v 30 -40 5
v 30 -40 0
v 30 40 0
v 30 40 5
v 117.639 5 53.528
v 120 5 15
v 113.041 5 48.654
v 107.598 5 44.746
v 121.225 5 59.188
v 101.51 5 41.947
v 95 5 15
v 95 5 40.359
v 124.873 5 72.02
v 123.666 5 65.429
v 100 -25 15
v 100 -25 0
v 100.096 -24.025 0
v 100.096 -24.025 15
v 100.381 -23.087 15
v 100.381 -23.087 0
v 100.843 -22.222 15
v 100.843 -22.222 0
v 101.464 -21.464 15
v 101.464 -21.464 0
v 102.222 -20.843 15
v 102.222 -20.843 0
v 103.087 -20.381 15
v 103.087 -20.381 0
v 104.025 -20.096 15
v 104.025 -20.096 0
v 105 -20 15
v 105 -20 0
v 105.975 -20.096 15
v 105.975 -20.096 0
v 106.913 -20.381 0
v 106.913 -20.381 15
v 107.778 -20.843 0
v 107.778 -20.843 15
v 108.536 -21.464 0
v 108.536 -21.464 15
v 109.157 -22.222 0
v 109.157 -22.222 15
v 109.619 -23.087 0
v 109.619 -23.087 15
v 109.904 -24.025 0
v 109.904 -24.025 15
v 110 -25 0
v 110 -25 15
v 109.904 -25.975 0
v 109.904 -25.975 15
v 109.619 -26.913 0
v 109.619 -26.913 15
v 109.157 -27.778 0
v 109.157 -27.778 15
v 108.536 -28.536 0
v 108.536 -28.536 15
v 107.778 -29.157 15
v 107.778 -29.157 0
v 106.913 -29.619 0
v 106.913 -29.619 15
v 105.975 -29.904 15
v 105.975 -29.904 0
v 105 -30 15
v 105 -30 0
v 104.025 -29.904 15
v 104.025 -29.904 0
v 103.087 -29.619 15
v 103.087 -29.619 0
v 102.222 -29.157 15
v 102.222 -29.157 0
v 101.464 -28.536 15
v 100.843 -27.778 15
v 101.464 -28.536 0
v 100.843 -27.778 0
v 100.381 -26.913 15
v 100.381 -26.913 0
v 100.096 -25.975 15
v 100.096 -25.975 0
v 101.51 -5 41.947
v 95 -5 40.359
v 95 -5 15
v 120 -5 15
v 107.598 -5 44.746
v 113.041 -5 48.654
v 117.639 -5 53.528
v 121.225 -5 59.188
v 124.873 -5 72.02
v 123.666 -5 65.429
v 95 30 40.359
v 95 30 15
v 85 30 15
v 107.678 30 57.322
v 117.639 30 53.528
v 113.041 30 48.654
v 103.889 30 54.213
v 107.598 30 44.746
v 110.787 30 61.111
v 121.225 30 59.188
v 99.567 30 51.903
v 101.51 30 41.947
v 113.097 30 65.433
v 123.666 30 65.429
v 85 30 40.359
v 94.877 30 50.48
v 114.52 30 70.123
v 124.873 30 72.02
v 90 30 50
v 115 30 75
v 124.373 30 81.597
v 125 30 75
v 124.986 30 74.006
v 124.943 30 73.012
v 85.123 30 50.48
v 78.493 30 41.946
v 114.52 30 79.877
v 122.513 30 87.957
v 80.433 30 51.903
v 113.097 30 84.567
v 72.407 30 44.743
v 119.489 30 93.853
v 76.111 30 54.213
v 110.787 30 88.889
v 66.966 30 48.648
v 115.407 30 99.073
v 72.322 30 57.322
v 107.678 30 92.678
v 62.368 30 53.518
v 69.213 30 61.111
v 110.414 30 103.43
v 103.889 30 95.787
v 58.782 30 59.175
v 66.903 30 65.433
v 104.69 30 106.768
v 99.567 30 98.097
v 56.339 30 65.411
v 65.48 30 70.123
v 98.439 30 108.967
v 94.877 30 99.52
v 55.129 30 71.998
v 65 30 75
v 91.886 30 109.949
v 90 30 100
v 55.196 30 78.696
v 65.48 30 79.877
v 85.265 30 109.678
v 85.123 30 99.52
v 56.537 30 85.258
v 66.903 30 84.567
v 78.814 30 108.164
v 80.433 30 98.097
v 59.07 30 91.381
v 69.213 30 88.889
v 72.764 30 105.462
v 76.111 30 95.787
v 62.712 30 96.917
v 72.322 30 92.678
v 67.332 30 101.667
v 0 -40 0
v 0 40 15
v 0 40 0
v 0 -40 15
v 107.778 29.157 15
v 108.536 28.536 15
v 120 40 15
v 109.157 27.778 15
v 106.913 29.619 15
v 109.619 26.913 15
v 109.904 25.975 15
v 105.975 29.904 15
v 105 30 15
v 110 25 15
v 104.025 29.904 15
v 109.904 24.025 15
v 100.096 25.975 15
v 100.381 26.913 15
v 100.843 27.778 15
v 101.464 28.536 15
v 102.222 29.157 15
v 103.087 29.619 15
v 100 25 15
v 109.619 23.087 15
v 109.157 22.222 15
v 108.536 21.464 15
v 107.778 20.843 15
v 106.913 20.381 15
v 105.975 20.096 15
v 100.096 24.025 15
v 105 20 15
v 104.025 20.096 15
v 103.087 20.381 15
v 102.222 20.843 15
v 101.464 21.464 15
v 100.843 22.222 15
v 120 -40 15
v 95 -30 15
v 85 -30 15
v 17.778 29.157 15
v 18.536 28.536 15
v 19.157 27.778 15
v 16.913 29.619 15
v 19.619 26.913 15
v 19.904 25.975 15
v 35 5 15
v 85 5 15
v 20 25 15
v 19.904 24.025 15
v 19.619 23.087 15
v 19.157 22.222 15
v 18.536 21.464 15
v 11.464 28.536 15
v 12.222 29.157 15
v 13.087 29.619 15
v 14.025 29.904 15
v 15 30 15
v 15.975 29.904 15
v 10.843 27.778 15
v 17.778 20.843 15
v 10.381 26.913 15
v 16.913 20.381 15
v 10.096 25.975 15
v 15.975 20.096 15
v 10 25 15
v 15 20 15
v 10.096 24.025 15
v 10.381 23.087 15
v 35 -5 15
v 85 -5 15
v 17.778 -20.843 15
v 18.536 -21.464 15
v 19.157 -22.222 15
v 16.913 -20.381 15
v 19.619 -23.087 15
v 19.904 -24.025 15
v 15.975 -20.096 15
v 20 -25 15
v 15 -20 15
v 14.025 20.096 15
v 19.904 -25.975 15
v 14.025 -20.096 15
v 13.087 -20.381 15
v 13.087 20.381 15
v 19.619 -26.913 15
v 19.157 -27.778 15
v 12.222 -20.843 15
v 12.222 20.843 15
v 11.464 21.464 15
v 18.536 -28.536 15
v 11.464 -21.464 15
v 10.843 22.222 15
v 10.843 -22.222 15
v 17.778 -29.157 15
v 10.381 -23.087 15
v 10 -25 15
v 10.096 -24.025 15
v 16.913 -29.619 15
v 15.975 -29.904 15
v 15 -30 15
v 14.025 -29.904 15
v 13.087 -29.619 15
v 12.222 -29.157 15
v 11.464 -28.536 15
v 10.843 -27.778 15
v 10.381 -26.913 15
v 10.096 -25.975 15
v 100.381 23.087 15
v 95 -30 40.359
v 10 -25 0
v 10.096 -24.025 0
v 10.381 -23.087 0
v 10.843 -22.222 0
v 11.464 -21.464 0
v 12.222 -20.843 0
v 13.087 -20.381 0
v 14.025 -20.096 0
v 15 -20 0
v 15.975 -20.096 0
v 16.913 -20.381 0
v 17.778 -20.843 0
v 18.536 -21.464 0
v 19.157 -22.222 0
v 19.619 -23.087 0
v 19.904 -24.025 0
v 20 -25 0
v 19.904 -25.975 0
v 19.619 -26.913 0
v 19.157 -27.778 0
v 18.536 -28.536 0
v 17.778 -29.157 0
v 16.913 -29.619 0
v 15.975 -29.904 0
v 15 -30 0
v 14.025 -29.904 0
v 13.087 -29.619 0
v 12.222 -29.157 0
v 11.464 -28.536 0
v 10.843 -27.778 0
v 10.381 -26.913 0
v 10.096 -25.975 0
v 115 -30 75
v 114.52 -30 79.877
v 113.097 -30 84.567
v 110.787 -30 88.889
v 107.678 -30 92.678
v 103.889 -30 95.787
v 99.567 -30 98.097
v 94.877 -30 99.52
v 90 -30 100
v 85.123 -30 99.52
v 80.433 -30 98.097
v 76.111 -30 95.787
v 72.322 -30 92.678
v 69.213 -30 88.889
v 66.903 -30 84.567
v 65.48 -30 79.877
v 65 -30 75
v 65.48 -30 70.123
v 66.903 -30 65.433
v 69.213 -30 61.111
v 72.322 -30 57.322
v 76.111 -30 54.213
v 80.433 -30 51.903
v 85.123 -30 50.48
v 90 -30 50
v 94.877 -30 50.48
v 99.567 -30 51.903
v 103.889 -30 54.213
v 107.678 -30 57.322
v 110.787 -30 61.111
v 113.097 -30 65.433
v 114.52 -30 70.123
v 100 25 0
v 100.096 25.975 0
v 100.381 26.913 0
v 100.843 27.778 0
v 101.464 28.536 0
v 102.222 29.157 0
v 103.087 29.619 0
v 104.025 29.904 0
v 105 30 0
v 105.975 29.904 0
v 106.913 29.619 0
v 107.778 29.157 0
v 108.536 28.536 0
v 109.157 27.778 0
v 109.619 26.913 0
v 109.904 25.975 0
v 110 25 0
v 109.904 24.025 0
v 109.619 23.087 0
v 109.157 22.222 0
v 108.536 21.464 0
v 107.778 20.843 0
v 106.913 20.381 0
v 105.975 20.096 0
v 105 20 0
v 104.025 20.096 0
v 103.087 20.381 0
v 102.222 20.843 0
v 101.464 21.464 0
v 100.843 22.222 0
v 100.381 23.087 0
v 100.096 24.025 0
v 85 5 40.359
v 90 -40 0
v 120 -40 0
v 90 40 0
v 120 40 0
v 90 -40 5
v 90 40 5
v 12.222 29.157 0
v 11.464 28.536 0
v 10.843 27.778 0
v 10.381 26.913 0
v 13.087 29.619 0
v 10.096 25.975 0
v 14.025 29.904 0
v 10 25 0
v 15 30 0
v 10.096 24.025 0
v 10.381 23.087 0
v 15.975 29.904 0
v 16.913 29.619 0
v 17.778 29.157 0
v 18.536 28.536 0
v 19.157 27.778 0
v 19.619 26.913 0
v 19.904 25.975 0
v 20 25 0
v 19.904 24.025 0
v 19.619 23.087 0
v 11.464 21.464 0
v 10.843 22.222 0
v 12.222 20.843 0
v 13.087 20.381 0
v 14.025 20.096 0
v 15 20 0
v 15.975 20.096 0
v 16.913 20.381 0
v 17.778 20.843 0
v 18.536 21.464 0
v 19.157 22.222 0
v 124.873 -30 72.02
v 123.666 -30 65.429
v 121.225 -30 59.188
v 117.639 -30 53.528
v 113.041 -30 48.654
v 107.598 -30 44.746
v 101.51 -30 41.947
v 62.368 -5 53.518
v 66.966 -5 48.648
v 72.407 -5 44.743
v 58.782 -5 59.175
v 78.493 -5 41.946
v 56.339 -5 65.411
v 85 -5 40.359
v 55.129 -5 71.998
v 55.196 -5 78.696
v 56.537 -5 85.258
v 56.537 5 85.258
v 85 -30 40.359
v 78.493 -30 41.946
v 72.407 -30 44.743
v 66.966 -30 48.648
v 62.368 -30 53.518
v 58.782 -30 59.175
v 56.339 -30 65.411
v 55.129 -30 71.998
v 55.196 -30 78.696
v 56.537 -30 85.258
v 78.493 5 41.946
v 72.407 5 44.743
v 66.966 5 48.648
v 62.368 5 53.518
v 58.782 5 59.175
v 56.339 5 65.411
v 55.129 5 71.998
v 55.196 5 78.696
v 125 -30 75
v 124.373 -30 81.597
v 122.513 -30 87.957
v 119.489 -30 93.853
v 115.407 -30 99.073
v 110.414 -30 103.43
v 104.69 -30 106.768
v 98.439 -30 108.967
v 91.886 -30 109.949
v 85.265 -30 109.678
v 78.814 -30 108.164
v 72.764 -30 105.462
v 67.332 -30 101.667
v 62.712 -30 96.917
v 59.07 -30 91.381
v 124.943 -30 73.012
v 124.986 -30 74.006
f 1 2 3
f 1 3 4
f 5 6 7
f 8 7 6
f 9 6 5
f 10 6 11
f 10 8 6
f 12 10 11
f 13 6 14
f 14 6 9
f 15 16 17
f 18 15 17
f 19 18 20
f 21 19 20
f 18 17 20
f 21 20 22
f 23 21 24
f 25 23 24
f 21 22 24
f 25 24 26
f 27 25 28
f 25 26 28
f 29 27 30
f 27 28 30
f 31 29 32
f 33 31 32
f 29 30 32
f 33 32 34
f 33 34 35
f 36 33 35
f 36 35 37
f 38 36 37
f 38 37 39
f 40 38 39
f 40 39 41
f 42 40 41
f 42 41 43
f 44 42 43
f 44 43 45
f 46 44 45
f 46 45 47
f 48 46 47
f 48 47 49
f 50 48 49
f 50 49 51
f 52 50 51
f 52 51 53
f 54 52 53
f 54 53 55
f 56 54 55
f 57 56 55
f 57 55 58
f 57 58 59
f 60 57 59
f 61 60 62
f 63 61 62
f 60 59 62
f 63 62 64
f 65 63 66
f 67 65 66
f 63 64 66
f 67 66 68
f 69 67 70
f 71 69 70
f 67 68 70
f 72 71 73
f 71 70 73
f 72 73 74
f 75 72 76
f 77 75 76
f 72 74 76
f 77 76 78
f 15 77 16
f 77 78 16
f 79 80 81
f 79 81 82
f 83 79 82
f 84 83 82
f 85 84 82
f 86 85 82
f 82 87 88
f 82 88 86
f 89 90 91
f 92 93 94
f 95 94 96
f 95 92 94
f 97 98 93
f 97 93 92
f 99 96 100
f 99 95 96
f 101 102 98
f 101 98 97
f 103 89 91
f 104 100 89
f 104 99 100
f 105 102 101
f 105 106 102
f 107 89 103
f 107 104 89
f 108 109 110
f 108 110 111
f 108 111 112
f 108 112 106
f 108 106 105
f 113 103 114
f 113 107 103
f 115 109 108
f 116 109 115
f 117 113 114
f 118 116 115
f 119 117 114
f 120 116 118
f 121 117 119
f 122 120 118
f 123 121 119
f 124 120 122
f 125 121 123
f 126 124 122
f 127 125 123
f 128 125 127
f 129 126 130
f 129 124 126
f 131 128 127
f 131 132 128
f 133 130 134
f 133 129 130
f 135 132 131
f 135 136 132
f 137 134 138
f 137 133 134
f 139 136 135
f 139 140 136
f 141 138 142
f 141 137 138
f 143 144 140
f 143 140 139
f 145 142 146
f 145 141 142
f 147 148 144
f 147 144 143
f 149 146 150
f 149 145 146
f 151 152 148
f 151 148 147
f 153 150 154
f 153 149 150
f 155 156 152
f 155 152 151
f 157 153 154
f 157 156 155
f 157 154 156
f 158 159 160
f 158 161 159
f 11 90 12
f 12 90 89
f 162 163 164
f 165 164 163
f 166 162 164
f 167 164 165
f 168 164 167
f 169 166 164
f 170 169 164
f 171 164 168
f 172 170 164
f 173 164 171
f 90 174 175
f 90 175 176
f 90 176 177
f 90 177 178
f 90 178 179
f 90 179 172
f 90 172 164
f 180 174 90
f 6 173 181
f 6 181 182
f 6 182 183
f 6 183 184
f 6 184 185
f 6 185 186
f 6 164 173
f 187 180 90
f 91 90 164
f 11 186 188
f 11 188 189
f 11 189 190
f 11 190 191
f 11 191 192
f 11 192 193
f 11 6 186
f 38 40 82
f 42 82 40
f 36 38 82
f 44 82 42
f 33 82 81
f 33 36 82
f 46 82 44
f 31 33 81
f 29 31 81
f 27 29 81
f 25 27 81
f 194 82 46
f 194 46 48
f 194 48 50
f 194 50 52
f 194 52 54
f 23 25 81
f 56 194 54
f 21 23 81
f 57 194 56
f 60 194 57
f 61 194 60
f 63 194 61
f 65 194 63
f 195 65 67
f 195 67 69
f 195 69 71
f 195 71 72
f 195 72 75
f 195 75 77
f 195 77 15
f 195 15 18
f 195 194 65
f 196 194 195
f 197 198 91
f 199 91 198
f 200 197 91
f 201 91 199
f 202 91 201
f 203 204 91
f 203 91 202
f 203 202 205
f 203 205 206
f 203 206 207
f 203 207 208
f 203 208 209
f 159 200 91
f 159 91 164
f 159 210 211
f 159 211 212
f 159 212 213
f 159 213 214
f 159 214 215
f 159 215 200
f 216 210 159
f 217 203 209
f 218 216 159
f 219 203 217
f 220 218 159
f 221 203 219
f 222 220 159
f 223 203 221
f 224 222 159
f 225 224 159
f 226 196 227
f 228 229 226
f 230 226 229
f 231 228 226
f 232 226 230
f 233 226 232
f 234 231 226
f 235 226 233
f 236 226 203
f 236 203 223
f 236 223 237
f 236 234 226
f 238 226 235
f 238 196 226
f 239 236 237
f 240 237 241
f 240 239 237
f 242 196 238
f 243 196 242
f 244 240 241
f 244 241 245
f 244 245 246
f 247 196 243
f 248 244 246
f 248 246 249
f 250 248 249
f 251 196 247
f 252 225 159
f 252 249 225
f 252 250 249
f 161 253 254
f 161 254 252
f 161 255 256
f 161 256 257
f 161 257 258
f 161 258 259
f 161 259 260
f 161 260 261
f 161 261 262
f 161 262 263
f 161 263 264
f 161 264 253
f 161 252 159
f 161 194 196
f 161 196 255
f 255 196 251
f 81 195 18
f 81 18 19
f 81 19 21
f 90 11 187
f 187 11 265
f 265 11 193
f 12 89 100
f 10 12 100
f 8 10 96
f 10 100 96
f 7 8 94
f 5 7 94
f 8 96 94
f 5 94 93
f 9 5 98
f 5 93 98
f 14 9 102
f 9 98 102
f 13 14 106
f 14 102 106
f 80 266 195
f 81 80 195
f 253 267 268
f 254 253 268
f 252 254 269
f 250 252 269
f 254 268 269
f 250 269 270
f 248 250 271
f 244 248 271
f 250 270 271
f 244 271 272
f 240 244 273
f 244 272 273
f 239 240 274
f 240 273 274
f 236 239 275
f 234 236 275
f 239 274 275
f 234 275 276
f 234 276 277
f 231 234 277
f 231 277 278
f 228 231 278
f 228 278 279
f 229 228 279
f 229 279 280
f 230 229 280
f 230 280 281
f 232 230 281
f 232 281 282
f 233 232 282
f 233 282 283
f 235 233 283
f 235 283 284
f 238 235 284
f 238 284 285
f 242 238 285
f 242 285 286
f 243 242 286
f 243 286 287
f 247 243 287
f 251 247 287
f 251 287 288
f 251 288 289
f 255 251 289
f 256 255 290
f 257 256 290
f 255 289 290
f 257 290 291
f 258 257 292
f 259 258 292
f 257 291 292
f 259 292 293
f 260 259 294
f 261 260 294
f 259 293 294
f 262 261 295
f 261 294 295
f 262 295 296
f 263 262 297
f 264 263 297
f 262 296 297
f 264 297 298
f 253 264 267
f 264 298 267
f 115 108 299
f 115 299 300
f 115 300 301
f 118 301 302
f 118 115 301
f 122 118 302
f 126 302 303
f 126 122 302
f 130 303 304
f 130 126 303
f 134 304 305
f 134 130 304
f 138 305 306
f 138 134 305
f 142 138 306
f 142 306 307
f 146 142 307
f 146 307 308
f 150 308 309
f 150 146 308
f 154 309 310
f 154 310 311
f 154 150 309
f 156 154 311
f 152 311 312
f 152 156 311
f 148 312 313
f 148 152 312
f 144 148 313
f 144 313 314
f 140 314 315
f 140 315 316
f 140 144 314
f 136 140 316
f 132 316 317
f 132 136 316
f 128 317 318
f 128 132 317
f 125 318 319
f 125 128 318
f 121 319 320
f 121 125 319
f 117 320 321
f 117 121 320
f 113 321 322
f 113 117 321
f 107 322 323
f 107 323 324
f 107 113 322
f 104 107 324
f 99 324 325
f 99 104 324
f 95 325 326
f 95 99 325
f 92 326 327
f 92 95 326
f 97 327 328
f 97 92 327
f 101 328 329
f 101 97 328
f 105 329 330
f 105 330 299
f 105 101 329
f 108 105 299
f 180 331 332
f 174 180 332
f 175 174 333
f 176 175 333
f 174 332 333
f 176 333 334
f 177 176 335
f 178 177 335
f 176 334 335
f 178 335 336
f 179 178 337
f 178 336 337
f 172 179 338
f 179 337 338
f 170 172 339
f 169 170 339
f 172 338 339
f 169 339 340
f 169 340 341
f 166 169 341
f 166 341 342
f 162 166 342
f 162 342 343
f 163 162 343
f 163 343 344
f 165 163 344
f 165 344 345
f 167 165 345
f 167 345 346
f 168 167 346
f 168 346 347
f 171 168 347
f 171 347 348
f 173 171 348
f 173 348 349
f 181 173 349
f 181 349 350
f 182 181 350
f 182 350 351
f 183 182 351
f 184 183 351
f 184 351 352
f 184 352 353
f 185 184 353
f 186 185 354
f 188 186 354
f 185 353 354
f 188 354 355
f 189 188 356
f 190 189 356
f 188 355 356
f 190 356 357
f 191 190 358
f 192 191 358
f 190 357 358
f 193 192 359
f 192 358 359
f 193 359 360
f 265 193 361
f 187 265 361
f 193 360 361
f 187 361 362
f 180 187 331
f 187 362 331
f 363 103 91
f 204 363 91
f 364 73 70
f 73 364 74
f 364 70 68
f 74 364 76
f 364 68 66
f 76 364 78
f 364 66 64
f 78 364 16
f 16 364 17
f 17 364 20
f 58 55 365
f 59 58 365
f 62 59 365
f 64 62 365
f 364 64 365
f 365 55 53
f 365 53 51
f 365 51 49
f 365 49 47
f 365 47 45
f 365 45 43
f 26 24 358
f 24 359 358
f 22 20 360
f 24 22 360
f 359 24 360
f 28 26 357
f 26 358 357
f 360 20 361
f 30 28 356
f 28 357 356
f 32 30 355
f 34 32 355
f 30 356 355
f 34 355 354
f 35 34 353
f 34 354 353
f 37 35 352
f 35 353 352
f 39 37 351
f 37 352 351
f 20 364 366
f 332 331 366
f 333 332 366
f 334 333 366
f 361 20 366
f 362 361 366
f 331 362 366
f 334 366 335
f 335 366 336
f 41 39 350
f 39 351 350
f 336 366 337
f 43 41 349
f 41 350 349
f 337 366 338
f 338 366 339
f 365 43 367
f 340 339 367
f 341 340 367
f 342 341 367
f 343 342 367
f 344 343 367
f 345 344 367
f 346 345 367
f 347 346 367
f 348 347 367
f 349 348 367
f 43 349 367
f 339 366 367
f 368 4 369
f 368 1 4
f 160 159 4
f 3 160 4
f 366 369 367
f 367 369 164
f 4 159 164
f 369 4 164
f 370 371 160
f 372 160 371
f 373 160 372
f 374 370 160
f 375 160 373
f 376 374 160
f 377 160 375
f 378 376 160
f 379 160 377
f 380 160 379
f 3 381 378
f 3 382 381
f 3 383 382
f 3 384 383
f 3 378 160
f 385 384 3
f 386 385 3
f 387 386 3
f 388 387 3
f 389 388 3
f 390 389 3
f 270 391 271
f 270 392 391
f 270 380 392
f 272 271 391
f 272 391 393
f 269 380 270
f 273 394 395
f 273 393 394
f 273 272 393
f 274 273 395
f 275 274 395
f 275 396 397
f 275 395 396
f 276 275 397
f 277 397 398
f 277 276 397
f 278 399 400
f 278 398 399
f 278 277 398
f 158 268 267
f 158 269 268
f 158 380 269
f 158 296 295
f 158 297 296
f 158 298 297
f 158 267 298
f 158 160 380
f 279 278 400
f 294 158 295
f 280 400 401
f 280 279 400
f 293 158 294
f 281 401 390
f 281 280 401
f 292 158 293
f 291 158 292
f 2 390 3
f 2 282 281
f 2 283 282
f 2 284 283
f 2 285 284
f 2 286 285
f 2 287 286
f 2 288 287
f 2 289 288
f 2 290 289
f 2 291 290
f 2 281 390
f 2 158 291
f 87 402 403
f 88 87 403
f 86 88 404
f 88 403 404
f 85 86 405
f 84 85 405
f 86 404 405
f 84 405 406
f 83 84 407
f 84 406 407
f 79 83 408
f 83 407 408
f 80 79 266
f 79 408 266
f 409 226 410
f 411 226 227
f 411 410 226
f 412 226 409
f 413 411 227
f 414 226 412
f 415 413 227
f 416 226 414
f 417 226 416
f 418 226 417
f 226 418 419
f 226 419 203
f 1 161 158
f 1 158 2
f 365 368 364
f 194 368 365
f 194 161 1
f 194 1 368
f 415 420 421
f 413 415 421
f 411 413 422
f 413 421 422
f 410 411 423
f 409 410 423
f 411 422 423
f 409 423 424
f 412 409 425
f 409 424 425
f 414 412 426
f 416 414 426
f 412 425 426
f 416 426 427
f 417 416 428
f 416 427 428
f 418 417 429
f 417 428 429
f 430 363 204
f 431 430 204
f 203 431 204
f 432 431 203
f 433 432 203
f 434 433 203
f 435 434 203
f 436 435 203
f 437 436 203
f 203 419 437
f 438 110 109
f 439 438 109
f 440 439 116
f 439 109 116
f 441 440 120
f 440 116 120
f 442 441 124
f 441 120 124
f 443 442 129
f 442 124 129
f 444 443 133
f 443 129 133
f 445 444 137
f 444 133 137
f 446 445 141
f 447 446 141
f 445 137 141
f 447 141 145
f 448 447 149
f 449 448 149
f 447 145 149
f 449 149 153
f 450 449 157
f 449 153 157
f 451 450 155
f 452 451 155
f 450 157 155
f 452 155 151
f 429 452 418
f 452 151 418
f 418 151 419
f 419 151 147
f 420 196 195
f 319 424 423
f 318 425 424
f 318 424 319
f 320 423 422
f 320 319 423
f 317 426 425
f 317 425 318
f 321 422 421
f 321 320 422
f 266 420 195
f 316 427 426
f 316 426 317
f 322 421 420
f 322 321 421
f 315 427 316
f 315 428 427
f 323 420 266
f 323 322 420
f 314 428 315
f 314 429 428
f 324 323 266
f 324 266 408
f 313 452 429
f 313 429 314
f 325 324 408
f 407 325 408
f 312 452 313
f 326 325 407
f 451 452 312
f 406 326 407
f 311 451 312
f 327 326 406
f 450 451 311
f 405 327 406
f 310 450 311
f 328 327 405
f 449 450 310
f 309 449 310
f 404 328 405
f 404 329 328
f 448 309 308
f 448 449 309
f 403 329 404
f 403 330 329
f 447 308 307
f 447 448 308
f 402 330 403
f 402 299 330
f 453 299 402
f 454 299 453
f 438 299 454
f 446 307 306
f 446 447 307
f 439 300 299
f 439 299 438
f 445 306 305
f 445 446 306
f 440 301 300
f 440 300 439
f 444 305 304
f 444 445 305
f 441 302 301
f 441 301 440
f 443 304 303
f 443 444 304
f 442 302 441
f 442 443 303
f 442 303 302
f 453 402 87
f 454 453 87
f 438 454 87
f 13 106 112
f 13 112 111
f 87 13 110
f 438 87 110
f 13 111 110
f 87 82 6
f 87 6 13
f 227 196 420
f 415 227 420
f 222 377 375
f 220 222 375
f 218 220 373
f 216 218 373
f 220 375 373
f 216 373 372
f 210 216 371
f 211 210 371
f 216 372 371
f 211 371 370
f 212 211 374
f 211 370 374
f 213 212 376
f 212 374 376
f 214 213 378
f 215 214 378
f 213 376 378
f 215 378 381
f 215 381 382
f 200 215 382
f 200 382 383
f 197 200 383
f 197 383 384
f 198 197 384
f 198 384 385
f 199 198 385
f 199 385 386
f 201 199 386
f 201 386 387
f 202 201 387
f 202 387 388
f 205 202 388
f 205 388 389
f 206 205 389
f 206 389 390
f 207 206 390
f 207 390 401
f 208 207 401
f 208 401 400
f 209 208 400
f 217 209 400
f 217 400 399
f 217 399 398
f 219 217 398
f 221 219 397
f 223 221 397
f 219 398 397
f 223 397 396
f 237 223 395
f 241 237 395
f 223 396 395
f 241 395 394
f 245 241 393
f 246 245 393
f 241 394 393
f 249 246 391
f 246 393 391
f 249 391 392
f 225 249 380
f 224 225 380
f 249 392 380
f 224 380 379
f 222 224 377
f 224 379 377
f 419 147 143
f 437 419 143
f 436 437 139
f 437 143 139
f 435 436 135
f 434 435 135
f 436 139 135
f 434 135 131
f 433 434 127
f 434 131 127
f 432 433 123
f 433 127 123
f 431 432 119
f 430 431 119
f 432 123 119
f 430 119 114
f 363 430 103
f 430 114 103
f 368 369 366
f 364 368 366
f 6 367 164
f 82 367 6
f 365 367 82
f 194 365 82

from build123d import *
from build123d import SkipClean  # not in build123d's __all__

# Parameters (mm, degrees)
F0_R      = 25
F1_DEPTH  = 40
F2_R      = 25
F3_DEPTH  = 10
F4_R      = 25
F5_DEPTH  = 10
F7_DEPTH  = 25
F9_DEPTH  = 25
F11_D     = 10
F11_DEPTH = 16.5
F11_TIP   = 3.0043030951


with BuildPart() as f1:
    # F0 (on Front) → F1 (new body, symmetric)
    with BuildSketch(Plane.XZ):
        Polygon((0, 15), (0, 0), (30, 0), (30, 5), (90, 5), (90, 0), (120, 0), (120, 15), (35, 15), align=None)
        with BuildLine():
            Line((56.536927729, 85.2578162484), (35, 15))
            Line((35, 15), (120, 15))
            Line((120, 15), (124.8728873319, 72.0197769993))
            ThreePointArc((124.8728873319, 72.0197769993), (83.3435508402, 40.638805542), (56.536927729, 85.2578162484))
        make_face()
        with BuildLine():
            ThreePointArc((125, 75), (95.186158044, 109.613635532), (56.536927729, 85.2578162484))
            ThreePointArc((56.536927729, 85.2578162484), (83.3435508402, 40.638805542), (124.8728873319, 72.0197769993))
            ThreePointArc((124.8728873319, 72.0197769993), (124.9682073934, 73.5085337111), (125, 75))
        make_face()
        with Locations((90, 75)):
            Circle(F0_R, mode=Mode.SUBTRACT)
    extrude(amount=F1_DEPTH, both=True)

    # F2 (on face) → F3 (cut)
    with BuildSketch(Plane.XZ.offset(40)):
        with BuildLine():
            Line((56.536927729, 85.2578162484), (35, 15))
            Line((35, 15), (120, 15))
            Line((120, 15), (124.8728873319, 72.0197769993))
            ThreePointArc((124.8728873319, 72.0197769993), (96.6564491598, 109.361194458), (56.536927729, 85.2578162484))
        make_face()
        with Locations((90, 75)):
            Circle(F2_R, mode=Mode.SUBTRACT)
    extrude(amount=-F3_DEPTH, mode=Mode.SUBTRACT)

    # F4 (on face) → F5 (cut)
    with BuildSketch(Plane(origin=(0, 40, 0), x_dir=(-1, 0, 0), z_dir=(0, 1, 0))):
        with BuildLine():
            Line((-120, 15), (-35, 15))
            Line((-35, 15), (-56.536927729, 85.2578162484))
            ThreePointArc((-56.536927729, 85.2578162484), (-96.6564491598, 109.361194458), (-124.8728873319, 72.0197769993))
            Line((-124.8728873319, 72.0197769993), (-120, 15))
        make_face()
        with Locations((-90, 75)):
            Circle(F4_R, mode=Mode.SUBTRACT)
    extrude(amount=-F5_DEPTH, mode=Mode.SUBTRACT)

    # F6 (on face) → F7 (cut)
    with BuildSketch(Plane.XZ.offset(30)):
        with BuildLine():
            ThreePointArc((85, 40.3589838486), (60.439413574, 56.2604234265), (56.536927729, 85.2578162484))
            Line((56.536927729, 85.2578162484), (35, 15))
            Line((35, 15), (85, 15))
            Line((85, 15), (85, 40.3589838486))
        make_face()
        with BuildLine():
            Line((120, 15), (124.8728873319, 72.0197769993))
            ThreePointArc((124.8728873319, 72.0197769993), (115.4570862783, 50.980492132), (95, 40.3589838486))
            Line((95, 40.3589838486), (95, 15))
            Line((95, 15), (120, 15))
        make_face()
    with SkipClean():  # cleaning this boolean's faces spoils the solid; the shape is the same uncleaned
        extrude(amount=-F7_DEPTH, mode=Mode.SUBTRACT)

    # F8 (on face) → F9 (cut)
    with BuildSketch(Plane(origin=(0, 30, 0), x_dir=(-1, 0, 0), z_dir=(0, 1, 0))):
        with BuildLine():
            ThreePointArc((-95, 40.3589838486), (-115.4570862783, 50.980492132), (-124.8728873319, 72.0197769993))
            Line((-124.8728873319, 72.0197769993), (-120, 15))
            Line((-120, 15), (-95, 15))
            Line((-95, 15), (-95, 40.3589838486))
        make_face()
        with BuildLine():
            Line((-35, 15), (-56.536927729, 85.2578162484))
            ThreePointArc((-56.536927729, 85.2578162484), (-60.439413574, 56.2604234265), (-85, 40.3589838486))
            Line((-85, 40.3589838486), (-85, 15))
            Line((-85, 15), (-35, 15))
        make_face()
    extrude(amount=-F9_DEPTH, mode=Mode.SUBTRACT)

    # F11
    with Locations(Plane.XY.offset(15)):
        with Locations((15, 25), (15, -25), (105, -25), (105, 25)):
            Hole(F11_D / 2, depth=F11_DEPTH)
            with Locations((0, 0, -(F11_DEPTH + F11_TIP / 2))):  # 118° drill point
                Cone(0, F11_D / 2, F11_TIP, mode=Mode.SUBTRACT)


solid = f1.part
